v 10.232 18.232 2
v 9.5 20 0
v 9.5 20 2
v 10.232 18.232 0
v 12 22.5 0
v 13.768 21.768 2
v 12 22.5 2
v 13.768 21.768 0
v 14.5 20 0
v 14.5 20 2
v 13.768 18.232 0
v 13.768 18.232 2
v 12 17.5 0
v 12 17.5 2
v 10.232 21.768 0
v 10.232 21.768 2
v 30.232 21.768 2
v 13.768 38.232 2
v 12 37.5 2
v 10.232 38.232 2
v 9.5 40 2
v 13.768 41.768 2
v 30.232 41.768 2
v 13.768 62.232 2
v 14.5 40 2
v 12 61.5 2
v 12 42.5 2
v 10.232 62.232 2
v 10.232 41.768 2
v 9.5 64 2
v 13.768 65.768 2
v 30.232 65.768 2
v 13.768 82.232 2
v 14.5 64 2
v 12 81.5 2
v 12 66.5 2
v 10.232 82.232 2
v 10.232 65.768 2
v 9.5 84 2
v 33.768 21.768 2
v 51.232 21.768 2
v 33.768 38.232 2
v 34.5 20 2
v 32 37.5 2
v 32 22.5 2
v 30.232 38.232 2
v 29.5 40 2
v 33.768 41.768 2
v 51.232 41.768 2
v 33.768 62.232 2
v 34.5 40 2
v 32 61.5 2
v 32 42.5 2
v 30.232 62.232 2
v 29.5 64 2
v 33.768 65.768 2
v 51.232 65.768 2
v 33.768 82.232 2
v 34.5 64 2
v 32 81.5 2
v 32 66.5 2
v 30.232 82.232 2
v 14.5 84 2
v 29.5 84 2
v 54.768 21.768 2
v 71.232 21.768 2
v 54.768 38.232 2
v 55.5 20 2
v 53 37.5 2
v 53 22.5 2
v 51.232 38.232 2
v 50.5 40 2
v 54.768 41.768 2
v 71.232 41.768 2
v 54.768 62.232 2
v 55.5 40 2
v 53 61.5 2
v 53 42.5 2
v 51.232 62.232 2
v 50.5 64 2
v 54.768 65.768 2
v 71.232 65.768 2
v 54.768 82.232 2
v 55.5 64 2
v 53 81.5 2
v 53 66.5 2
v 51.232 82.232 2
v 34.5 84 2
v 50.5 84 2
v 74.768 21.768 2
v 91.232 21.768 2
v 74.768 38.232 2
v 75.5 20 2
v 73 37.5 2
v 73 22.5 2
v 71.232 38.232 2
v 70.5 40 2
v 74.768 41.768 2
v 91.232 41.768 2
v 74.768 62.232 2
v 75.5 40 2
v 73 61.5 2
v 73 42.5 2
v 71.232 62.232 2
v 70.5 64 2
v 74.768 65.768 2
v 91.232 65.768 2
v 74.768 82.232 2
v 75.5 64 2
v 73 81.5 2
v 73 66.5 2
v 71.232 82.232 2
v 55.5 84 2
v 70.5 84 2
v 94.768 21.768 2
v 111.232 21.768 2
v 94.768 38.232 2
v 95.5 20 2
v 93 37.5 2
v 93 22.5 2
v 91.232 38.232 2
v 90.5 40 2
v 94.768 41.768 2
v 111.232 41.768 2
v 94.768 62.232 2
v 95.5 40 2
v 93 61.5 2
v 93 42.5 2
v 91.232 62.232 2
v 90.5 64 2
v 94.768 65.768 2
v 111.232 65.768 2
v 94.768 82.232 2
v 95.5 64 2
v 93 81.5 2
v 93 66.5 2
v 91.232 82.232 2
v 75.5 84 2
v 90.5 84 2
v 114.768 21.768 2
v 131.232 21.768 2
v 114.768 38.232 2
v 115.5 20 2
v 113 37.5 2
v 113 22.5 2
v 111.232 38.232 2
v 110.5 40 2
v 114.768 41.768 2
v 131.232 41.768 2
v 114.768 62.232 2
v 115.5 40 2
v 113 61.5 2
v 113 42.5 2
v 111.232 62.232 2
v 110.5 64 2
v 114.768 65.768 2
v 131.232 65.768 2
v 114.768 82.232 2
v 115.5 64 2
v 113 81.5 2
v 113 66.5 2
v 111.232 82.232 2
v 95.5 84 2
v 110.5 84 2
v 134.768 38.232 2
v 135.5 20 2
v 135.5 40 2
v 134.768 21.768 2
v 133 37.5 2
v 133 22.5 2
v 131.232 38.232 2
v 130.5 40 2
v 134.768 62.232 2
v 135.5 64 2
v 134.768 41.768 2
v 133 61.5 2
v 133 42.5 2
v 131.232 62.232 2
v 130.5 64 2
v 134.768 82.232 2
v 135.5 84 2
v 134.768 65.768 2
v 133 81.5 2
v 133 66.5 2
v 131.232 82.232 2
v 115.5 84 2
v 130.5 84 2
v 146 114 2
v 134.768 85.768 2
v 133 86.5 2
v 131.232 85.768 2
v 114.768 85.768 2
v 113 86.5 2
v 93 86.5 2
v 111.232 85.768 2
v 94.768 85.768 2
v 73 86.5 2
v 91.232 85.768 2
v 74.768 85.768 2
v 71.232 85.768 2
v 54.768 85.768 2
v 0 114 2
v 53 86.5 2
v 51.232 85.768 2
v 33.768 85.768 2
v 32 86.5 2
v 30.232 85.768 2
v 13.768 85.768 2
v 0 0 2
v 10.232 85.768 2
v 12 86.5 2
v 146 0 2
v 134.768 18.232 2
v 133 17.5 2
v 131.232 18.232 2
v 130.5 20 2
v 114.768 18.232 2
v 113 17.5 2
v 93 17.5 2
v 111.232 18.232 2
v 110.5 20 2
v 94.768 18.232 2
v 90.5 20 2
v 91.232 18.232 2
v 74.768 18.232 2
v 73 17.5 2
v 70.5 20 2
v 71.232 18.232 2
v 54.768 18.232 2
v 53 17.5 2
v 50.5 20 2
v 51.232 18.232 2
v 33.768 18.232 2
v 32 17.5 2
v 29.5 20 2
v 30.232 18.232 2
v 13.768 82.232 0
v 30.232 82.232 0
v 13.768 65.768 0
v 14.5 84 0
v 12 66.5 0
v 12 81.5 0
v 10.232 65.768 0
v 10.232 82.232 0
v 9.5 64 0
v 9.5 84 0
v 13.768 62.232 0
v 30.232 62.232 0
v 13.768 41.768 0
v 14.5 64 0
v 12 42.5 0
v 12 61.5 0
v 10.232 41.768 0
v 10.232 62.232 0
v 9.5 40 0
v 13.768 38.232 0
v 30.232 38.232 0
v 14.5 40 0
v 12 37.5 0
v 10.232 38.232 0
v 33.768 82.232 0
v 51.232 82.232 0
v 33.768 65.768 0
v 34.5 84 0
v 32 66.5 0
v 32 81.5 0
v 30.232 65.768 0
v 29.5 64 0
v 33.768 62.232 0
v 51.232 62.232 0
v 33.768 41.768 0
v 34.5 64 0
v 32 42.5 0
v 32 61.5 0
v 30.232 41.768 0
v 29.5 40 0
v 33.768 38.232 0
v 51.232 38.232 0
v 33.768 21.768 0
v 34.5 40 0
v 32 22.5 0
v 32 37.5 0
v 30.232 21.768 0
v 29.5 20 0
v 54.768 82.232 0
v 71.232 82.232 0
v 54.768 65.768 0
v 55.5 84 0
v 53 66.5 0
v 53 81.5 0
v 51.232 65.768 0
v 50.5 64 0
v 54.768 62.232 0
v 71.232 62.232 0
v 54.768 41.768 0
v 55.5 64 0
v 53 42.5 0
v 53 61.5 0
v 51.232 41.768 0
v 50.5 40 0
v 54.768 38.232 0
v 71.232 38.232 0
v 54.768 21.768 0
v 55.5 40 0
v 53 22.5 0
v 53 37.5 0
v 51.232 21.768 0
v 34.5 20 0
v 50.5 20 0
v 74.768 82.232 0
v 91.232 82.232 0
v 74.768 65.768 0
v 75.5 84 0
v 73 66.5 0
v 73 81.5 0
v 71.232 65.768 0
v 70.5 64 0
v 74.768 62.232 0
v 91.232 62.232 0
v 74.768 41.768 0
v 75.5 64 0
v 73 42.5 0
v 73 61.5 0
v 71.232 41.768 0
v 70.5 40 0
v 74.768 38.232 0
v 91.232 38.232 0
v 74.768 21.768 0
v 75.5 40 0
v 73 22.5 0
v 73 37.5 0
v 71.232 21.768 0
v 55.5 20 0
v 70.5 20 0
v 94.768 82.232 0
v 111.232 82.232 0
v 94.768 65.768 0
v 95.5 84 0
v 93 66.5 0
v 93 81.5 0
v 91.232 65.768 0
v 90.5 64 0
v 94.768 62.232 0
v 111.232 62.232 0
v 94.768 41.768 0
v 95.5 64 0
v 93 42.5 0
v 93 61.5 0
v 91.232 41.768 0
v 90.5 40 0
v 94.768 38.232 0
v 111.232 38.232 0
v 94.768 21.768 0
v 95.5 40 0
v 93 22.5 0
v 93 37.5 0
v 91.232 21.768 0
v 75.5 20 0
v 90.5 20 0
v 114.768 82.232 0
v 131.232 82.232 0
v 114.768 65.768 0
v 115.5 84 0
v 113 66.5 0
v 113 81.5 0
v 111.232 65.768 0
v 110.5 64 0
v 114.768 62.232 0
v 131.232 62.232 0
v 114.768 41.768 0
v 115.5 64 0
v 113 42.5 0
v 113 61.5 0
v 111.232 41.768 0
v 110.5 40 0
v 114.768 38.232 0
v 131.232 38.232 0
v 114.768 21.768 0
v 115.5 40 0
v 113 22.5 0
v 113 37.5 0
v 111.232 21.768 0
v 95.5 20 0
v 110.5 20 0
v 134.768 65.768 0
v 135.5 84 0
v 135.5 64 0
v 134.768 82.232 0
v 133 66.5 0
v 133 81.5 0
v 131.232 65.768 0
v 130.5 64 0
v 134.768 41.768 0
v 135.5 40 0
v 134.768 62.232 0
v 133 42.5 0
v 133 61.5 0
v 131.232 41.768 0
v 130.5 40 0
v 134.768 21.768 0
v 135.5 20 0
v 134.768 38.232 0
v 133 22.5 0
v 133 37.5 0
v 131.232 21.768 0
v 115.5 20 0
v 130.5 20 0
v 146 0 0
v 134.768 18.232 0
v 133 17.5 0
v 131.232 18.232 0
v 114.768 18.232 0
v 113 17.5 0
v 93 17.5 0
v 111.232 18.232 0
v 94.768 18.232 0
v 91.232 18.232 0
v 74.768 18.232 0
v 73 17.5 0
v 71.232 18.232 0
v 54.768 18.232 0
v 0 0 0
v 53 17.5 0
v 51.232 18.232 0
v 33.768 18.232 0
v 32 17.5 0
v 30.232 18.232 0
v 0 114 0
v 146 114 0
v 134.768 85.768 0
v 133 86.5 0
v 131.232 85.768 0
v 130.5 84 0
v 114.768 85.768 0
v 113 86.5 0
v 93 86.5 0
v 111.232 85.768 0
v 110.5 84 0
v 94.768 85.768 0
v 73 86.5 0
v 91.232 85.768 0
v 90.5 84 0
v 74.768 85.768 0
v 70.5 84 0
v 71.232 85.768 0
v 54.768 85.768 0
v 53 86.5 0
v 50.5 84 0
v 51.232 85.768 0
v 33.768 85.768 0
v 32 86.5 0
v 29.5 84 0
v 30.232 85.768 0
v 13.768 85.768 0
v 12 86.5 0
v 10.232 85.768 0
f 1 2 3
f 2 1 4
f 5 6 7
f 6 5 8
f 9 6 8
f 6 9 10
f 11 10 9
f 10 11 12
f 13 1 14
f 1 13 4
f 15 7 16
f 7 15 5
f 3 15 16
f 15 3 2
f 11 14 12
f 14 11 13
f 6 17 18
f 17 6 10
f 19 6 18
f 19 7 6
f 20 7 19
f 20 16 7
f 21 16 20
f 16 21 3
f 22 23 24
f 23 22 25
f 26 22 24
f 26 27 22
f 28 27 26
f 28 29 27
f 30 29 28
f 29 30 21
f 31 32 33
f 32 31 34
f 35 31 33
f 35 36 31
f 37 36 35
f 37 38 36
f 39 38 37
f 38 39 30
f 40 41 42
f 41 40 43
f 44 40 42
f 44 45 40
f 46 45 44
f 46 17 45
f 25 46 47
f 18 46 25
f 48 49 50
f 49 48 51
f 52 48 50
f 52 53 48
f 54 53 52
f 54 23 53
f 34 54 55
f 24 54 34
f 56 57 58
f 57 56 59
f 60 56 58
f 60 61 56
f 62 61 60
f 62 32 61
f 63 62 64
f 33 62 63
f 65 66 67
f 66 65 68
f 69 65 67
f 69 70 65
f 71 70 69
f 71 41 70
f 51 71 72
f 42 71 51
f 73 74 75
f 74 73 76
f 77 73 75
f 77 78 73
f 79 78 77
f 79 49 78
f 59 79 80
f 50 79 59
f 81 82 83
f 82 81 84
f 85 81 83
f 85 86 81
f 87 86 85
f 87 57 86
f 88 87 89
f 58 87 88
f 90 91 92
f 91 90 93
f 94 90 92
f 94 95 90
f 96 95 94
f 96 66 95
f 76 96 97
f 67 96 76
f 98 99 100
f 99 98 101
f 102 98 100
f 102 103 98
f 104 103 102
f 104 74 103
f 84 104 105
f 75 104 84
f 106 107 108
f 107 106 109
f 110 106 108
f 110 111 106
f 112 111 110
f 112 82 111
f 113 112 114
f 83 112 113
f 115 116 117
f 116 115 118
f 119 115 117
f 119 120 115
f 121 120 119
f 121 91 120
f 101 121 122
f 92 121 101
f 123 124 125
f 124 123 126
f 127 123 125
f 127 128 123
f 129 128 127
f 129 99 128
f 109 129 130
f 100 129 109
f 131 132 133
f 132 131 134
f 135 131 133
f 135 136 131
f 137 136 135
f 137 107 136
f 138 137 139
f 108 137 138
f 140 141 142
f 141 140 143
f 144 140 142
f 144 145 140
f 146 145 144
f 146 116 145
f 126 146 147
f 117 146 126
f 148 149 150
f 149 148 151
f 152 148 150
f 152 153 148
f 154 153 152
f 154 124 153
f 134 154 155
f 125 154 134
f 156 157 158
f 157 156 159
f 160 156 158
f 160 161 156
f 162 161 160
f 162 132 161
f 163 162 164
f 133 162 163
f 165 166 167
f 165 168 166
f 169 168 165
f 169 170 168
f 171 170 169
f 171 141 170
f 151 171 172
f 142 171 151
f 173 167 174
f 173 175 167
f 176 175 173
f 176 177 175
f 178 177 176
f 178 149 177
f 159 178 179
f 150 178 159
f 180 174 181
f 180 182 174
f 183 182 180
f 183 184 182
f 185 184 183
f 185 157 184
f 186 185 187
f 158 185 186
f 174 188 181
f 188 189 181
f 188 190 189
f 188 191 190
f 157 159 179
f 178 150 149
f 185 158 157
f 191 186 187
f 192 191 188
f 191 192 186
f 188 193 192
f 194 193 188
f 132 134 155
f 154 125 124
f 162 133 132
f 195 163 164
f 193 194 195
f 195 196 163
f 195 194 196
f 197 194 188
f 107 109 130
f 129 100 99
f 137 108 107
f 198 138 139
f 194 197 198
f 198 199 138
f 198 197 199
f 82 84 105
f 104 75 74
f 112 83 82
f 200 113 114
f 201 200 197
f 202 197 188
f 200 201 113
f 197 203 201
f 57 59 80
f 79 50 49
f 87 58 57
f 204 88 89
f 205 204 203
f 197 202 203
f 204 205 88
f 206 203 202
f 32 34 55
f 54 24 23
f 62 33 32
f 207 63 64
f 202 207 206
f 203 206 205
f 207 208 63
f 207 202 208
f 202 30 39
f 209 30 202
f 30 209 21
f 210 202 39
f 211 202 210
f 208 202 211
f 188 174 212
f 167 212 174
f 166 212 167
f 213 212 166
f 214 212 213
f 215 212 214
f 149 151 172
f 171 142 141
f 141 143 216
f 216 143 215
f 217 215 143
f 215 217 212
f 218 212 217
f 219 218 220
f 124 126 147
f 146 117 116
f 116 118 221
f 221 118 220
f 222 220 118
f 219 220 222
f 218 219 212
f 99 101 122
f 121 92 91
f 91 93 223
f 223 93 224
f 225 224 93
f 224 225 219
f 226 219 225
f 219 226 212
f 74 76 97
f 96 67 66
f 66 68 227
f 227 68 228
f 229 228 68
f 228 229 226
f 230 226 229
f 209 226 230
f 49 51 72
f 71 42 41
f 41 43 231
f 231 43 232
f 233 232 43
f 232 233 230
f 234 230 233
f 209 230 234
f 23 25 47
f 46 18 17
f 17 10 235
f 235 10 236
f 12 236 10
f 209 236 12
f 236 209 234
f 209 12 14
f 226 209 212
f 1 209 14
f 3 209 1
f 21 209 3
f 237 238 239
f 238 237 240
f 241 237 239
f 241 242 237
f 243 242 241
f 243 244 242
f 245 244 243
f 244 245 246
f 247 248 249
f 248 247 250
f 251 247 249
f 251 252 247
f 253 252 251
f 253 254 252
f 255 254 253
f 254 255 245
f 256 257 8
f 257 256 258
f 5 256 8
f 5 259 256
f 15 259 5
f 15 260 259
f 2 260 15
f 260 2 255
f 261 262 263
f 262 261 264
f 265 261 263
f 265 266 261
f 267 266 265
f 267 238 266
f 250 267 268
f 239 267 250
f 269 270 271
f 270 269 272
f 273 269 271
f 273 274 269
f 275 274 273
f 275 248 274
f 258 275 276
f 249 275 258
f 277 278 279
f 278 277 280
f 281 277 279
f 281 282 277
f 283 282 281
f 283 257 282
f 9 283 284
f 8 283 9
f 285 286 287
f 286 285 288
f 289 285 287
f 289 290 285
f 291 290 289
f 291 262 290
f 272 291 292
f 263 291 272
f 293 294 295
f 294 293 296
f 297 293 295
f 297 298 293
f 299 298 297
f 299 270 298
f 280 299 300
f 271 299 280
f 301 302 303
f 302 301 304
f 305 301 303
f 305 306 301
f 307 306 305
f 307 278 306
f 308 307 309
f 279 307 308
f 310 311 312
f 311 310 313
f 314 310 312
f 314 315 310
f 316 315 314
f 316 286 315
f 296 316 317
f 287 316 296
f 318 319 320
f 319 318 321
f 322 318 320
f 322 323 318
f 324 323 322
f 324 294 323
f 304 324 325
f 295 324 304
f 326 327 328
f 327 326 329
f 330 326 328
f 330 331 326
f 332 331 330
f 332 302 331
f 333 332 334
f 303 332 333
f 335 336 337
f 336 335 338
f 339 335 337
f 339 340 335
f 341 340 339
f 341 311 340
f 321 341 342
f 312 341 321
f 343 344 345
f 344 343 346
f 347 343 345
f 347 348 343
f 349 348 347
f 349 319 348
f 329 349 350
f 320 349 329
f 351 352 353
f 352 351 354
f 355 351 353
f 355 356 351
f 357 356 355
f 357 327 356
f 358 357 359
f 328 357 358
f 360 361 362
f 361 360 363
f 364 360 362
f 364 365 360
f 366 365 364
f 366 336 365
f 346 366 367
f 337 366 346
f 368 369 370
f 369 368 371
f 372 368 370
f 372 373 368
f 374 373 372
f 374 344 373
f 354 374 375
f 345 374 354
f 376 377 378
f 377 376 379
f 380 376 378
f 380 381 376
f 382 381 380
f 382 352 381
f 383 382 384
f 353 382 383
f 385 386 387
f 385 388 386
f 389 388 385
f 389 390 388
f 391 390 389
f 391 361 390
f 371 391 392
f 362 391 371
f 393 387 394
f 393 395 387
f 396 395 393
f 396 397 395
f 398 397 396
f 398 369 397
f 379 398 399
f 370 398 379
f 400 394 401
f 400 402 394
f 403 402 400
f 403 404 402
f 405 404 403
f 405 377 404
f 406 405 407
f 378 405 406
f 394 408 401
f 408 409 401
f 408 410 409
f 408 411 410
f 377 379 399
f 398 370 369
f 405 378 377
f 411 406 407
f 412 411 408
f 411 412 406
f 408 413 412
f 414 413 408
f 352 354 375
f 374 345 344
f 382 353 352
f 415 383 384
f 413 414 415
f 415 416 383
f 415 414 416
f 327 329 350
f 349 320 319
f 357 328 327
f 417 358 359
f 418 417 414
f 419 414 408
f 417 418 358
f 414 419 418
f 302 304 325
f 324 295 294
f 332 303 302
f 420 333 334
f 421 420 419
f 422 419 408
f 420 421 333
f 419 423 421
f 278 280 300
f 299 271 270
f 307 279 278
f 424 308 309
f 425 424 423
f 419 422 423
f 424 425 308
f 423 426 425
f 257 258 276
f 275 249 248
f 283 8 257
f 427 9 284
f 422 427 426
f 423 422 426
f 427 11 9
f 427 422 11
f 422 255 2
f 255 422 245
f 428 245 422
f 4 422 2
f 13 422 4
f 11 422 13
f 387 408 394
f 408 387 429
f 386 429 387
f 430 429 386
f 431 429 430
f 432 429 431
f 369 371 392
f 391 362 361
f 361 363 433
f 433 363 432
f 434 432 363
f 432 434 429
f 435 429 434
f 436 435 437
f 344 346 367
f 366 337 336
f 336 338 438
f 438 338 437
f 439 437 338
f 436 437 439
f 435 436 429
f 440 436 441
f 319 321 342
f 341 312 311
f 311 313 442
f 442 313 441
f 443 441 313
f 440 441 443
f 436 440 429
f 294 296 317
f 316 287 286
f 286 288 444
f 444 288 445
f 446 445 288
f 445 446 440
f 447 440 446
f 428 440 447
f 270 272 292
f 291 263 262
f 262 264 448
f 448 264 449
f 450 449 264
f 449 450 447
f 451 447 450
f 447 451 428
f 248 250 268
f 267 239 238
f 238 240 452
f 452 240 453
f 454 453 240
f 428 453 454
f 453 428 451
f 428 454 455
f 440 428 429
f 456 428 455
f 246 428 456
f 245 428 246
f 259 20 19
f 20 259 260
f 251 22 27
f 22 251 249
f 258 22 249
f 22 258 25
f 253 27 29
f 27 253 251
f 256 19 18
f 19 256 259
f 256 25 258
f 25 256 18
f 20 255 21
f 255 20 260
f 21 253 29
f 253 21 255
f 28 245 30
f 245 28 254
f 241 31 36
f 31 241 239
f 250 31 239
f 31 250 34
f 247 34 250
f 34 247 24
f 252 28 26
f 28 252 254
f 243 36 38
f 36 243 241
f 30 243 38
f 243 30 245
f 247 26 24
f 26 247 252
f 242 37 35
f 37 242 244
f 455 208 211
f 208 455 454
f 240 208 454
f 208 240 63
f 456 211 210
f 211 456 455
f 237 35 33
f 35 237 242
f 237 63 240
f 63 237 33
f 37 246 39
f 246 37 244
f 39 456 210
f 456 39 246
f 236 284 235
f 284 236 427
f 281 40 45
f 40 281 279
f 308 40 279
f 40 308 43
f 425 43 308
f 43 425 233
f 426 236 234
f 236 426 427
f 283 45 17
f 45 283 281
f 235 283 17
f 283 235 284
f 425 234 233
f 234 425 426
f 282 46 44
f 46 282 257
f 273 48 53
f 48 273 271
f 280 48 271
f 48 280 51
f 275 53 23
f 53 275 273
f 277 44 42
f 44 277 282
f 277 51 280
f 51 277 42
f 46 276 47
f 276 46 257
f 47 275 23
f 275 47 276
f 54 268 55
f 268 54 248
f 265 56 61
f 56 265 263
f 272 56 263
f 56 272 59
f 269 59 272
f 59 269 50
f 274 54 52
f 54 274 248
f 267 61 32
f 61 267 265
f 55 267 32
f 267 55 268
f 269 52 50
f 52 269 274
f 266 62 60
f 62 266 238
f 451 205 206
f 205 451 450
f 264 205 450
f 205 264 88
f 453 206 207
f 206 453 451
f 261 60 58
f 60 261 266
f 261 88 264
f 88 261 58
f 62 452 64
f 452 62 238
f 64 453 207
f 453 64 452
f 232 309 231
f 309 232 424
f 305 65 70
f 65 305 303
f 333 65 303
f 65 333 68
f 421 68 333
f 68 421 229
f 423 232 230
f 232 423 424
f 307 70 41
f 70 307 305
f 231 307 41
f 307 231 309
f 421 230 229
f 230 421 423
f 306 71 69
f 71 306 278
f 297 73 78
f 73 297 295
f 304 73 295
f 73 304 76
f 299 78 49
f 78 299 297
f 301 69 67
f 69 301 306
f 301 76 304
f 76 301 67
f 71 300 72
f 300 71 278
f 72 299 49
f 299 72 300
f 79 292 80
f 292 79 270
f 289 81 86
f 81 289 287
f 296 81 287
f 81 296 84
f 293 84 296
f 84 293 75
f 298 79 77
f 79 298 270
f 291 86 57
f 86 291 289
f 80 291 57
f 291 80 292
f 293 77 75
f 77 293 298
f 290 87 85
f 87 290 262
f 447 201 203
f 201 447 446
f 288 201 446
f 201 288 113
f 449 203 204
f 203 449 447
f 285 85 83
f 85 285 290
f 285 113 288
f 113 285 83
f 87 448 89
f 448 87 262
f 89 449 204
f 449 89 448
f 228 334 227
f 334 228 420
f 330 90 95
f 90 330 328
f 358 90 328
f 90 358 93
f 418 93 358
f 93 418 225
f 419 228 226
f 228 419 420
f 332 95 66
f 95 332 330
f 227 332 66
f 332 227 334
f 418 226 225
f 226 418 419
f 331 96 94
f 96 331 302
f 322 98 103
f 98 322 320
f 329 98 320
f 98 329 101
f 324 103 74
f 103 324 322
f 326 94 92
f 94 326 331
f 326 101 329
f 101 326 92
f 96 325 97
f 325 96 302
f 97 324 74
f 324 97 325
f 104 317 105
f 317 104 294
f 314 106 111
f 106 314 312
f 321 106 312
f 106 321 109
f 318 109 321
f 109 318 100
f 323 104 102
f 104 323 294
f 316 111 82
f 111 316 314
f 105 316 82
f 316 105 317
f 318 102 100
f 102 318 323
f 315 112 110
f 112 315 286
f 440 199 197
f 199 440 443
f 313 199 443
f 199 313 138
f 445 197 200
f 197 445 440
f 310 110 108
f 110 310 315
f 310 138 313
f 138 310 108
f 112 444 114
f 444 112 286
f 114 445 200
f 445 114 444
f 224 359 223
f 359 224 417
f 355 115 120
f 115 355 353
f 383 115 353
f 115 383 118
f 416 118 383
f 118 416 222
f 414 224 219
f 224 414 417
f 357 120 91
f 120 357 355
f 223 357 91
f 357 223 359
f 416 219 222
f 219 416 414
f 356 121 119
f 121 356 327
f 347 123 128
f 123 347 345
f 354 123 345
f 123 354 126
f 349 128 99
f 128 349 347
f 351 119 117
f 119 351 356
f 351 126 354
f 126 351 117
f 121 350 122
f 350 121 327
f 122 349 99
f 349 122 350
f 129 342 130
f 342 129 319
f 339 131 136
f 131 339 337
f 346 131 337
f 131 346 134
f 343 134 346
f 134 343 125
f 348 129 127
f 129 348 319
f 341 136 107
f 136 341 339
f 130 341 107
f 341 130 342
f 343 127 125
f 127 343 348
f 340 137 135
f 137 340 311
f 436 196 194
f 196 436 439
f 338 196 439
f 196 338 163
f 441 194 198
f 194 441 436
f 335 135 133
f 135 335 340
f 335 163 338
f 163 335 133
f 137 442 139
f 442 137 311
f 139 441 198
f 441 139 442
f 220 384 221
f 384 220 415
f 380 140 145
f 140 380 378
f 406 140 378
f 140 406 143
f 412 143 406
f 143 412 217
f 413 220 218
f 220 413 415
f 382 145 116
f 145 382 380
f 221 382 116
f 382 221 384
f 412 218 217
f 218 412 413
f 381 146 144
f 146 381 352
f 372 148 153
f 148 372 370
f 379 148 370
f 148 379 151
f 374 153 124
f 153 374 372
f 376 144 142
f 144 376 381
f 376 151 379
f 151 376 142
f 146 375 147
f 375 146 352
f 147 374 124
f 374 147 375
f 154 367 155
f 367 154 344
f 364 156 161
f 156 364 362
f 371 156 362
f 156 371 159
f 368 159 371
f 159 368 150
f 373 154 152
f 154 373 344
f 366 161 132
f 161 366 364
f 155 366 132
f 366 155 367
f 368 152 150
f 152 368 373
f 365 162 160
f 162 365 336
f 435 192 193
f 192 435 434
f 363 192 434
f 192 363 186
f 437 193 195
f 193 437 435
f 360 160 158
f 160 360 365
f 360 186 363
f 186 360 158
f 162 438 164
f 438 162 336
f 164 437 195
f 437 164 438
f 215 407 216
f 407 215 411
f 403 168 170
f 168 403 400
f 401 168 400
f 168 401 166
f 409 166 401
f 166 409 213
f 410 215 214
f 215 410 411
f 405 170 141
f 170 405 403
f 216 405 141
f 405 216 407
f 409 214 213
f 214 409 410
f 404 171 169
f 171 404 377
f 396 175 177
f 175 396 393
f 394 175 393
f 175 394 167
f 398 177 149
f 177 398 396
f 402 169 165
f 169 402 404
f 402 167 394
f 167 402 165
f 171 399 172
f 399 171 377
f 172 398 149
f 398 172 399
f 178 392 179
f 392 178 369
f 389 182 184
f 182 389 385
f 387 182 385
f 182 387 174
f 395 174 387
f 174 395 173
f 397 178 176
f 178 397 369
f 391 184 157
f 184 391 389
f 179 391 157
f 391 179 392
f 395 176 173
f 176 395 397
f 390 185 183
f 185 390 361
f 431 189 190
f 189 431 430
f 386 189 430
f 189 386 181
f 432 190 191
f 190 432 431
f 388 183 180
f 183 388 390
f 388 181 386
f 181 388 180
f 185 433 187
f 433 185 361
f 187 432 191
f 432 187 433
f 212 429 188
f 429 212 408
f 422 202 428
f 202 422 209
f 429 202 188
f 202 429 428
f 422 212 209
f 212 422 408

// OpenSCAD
module banana_plug(){
  cylinder(h = 2, r = 2.5, center = false);
  translate([0,20,0])
  cylinder(h = 2, r = 2.5, center = false);
}

module row(){
    translate([0,20,0])
    banana_plug();
    translate([0,114-20-30,0]) 
    banana_plug();
}

difference(){
  cube([146,114,2]);
  
  translate([12,0,0]) {
    row();
  }
  translate([32,0,0]) {
    row();
  }
  translate([53,0,0]) {
    row();
  }
  translate([73,0,0]) {
    row();
  }
  translate([93,0,0]) {
    row();
  }
  translate([113,0,0]) {
    row();
  }
  translate([133,0,0]) {
    row();
  }
}
